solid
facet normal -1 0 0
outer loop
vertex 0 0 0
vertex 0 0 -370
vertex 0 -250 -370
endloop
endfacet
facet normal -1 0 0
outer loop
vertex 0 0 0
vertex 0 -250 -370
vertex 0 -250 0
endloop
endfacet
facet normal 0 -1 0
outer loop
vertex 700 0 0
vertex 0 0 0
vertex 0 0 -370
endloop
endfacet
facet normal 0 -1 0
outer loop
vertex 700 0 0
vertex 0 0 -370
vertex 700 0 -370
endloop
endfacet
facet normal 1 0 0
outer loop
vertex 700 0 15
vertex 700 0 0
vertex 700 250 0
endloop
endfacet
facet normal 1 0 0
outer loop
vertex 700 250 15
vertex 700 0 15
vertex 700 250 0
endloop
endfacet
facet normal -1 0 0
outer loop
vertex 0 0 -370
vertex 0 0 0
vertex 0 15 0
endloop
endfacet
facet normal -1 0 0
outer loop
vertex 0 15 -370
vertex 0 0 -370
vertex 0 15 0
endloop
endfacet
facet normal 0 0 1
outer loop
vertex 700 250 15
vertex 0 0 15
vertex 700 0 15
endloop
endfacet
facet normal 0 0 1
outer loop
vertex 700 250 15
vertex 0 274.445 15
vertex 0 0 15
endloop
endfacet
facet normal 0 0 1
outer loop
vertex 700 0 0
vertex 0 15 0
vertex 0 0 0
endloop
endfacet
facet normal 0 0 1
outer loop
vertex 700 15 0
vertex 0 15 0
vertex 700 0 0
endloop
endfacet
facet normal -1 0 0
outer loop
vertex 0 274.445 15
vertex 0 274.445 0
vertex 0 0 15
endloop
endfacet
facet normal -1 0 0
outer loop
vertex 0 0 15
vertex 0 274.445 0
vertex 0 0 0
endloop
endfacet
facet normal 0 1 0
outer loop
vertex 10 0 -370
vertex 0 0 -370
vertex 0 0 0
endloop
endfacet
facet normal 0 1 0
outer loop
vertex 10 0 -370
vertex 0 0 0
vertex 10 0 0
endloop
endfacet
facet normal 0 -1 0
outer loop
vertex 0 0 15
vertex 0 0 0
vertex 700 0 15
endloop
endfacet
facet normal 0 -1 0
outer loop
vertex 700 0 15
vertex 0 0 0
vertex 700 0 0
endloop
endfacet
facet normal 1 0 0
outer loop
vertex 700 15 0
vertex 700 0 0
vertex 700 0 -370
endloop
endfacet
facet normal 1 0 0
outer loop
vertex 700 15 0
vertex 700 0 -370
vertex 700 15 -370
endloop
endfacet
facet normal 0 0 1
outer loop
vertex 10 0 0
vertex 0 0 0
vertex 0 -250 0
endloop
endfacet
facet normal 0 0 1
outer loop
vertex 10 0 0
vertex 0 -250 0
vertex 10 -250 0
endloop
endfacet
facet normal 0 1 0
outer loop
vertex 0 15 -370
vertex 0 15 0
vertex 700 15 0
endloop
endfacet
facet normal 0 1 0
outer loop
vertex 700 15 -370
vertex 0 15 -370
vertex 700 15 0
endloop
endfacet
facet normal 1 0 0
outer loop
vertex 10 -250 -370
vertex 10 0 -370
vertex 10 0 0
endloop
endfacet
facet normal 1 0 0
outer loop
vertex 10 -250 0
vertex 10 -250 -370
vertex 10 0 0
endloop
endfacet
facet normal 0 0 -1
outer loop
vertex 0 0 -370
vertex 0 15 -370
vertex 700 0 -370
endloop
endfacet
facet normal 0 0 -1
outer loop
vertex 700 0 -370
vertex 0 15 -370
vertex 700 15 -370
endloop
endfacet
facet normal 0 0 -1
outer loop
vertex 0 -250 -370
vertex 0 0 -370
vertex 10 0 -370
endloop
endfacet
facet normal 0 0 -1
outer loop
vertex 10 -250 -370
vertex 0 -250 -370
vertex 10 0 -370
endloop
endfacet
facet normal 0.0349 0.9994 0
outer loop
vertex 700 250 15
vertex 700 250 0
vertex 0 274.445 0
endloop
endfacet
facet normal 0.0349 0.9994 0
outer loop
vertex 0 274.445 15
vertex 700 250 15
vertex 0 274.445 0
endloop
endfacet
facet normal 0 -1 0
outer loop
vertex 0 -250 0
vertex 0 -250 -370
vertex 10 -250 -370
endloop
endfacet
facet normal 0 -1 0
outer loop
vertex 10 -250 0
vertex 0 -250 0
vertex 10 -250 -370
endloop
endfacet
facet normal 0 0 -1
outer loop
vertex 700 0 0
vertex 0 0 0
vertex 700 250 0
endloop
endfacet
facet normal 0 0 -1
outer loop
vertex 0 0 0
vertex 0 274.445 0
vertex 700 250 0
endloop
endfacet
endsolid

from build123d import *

# Parameters (mm, degrees)
PAD_DEPTH    = 15
SKETCH001_W  = 700
SKETCH001_H  = 15
PAD001_DEPTH = 370
SKETCH002_W  = 10
SKETCH002_H  = 370
PAD002_DEPTH = 250


with BuildPart() as parrois:
    # Sketch → Pad (new body)
    with BuildSketch(Plane.XY):
        Polygon((0, 0), (700, 0), (700, 250), (0, 274.444539), (0, 250), align=None)
    extrude(amount=PAD_DEPTH)


with BuildPart() as fond_caisse:
    # Sketch001 → Pad001 (new body)
    with BuildSketch(Plane.XY):
        with Locations((350, 7.5)):
            Rectangle(SKETCH001_W, SKETCH001_H)
    extrude(amount=-PAD001_DEPTH)


with BuildPart() as parois_avant:
    # Sketch002 → Pad002 (new body)
    with BuildSketch(Plane.XZ):
        with Locations((5, -185)):
            Rectangle(SKETCH002_W, SKETCH002_H)
    extrude(amount=PAD002_DEPTH)


solid = Compound([parrois.part, fond_caisse.part, parois_avant.part])
